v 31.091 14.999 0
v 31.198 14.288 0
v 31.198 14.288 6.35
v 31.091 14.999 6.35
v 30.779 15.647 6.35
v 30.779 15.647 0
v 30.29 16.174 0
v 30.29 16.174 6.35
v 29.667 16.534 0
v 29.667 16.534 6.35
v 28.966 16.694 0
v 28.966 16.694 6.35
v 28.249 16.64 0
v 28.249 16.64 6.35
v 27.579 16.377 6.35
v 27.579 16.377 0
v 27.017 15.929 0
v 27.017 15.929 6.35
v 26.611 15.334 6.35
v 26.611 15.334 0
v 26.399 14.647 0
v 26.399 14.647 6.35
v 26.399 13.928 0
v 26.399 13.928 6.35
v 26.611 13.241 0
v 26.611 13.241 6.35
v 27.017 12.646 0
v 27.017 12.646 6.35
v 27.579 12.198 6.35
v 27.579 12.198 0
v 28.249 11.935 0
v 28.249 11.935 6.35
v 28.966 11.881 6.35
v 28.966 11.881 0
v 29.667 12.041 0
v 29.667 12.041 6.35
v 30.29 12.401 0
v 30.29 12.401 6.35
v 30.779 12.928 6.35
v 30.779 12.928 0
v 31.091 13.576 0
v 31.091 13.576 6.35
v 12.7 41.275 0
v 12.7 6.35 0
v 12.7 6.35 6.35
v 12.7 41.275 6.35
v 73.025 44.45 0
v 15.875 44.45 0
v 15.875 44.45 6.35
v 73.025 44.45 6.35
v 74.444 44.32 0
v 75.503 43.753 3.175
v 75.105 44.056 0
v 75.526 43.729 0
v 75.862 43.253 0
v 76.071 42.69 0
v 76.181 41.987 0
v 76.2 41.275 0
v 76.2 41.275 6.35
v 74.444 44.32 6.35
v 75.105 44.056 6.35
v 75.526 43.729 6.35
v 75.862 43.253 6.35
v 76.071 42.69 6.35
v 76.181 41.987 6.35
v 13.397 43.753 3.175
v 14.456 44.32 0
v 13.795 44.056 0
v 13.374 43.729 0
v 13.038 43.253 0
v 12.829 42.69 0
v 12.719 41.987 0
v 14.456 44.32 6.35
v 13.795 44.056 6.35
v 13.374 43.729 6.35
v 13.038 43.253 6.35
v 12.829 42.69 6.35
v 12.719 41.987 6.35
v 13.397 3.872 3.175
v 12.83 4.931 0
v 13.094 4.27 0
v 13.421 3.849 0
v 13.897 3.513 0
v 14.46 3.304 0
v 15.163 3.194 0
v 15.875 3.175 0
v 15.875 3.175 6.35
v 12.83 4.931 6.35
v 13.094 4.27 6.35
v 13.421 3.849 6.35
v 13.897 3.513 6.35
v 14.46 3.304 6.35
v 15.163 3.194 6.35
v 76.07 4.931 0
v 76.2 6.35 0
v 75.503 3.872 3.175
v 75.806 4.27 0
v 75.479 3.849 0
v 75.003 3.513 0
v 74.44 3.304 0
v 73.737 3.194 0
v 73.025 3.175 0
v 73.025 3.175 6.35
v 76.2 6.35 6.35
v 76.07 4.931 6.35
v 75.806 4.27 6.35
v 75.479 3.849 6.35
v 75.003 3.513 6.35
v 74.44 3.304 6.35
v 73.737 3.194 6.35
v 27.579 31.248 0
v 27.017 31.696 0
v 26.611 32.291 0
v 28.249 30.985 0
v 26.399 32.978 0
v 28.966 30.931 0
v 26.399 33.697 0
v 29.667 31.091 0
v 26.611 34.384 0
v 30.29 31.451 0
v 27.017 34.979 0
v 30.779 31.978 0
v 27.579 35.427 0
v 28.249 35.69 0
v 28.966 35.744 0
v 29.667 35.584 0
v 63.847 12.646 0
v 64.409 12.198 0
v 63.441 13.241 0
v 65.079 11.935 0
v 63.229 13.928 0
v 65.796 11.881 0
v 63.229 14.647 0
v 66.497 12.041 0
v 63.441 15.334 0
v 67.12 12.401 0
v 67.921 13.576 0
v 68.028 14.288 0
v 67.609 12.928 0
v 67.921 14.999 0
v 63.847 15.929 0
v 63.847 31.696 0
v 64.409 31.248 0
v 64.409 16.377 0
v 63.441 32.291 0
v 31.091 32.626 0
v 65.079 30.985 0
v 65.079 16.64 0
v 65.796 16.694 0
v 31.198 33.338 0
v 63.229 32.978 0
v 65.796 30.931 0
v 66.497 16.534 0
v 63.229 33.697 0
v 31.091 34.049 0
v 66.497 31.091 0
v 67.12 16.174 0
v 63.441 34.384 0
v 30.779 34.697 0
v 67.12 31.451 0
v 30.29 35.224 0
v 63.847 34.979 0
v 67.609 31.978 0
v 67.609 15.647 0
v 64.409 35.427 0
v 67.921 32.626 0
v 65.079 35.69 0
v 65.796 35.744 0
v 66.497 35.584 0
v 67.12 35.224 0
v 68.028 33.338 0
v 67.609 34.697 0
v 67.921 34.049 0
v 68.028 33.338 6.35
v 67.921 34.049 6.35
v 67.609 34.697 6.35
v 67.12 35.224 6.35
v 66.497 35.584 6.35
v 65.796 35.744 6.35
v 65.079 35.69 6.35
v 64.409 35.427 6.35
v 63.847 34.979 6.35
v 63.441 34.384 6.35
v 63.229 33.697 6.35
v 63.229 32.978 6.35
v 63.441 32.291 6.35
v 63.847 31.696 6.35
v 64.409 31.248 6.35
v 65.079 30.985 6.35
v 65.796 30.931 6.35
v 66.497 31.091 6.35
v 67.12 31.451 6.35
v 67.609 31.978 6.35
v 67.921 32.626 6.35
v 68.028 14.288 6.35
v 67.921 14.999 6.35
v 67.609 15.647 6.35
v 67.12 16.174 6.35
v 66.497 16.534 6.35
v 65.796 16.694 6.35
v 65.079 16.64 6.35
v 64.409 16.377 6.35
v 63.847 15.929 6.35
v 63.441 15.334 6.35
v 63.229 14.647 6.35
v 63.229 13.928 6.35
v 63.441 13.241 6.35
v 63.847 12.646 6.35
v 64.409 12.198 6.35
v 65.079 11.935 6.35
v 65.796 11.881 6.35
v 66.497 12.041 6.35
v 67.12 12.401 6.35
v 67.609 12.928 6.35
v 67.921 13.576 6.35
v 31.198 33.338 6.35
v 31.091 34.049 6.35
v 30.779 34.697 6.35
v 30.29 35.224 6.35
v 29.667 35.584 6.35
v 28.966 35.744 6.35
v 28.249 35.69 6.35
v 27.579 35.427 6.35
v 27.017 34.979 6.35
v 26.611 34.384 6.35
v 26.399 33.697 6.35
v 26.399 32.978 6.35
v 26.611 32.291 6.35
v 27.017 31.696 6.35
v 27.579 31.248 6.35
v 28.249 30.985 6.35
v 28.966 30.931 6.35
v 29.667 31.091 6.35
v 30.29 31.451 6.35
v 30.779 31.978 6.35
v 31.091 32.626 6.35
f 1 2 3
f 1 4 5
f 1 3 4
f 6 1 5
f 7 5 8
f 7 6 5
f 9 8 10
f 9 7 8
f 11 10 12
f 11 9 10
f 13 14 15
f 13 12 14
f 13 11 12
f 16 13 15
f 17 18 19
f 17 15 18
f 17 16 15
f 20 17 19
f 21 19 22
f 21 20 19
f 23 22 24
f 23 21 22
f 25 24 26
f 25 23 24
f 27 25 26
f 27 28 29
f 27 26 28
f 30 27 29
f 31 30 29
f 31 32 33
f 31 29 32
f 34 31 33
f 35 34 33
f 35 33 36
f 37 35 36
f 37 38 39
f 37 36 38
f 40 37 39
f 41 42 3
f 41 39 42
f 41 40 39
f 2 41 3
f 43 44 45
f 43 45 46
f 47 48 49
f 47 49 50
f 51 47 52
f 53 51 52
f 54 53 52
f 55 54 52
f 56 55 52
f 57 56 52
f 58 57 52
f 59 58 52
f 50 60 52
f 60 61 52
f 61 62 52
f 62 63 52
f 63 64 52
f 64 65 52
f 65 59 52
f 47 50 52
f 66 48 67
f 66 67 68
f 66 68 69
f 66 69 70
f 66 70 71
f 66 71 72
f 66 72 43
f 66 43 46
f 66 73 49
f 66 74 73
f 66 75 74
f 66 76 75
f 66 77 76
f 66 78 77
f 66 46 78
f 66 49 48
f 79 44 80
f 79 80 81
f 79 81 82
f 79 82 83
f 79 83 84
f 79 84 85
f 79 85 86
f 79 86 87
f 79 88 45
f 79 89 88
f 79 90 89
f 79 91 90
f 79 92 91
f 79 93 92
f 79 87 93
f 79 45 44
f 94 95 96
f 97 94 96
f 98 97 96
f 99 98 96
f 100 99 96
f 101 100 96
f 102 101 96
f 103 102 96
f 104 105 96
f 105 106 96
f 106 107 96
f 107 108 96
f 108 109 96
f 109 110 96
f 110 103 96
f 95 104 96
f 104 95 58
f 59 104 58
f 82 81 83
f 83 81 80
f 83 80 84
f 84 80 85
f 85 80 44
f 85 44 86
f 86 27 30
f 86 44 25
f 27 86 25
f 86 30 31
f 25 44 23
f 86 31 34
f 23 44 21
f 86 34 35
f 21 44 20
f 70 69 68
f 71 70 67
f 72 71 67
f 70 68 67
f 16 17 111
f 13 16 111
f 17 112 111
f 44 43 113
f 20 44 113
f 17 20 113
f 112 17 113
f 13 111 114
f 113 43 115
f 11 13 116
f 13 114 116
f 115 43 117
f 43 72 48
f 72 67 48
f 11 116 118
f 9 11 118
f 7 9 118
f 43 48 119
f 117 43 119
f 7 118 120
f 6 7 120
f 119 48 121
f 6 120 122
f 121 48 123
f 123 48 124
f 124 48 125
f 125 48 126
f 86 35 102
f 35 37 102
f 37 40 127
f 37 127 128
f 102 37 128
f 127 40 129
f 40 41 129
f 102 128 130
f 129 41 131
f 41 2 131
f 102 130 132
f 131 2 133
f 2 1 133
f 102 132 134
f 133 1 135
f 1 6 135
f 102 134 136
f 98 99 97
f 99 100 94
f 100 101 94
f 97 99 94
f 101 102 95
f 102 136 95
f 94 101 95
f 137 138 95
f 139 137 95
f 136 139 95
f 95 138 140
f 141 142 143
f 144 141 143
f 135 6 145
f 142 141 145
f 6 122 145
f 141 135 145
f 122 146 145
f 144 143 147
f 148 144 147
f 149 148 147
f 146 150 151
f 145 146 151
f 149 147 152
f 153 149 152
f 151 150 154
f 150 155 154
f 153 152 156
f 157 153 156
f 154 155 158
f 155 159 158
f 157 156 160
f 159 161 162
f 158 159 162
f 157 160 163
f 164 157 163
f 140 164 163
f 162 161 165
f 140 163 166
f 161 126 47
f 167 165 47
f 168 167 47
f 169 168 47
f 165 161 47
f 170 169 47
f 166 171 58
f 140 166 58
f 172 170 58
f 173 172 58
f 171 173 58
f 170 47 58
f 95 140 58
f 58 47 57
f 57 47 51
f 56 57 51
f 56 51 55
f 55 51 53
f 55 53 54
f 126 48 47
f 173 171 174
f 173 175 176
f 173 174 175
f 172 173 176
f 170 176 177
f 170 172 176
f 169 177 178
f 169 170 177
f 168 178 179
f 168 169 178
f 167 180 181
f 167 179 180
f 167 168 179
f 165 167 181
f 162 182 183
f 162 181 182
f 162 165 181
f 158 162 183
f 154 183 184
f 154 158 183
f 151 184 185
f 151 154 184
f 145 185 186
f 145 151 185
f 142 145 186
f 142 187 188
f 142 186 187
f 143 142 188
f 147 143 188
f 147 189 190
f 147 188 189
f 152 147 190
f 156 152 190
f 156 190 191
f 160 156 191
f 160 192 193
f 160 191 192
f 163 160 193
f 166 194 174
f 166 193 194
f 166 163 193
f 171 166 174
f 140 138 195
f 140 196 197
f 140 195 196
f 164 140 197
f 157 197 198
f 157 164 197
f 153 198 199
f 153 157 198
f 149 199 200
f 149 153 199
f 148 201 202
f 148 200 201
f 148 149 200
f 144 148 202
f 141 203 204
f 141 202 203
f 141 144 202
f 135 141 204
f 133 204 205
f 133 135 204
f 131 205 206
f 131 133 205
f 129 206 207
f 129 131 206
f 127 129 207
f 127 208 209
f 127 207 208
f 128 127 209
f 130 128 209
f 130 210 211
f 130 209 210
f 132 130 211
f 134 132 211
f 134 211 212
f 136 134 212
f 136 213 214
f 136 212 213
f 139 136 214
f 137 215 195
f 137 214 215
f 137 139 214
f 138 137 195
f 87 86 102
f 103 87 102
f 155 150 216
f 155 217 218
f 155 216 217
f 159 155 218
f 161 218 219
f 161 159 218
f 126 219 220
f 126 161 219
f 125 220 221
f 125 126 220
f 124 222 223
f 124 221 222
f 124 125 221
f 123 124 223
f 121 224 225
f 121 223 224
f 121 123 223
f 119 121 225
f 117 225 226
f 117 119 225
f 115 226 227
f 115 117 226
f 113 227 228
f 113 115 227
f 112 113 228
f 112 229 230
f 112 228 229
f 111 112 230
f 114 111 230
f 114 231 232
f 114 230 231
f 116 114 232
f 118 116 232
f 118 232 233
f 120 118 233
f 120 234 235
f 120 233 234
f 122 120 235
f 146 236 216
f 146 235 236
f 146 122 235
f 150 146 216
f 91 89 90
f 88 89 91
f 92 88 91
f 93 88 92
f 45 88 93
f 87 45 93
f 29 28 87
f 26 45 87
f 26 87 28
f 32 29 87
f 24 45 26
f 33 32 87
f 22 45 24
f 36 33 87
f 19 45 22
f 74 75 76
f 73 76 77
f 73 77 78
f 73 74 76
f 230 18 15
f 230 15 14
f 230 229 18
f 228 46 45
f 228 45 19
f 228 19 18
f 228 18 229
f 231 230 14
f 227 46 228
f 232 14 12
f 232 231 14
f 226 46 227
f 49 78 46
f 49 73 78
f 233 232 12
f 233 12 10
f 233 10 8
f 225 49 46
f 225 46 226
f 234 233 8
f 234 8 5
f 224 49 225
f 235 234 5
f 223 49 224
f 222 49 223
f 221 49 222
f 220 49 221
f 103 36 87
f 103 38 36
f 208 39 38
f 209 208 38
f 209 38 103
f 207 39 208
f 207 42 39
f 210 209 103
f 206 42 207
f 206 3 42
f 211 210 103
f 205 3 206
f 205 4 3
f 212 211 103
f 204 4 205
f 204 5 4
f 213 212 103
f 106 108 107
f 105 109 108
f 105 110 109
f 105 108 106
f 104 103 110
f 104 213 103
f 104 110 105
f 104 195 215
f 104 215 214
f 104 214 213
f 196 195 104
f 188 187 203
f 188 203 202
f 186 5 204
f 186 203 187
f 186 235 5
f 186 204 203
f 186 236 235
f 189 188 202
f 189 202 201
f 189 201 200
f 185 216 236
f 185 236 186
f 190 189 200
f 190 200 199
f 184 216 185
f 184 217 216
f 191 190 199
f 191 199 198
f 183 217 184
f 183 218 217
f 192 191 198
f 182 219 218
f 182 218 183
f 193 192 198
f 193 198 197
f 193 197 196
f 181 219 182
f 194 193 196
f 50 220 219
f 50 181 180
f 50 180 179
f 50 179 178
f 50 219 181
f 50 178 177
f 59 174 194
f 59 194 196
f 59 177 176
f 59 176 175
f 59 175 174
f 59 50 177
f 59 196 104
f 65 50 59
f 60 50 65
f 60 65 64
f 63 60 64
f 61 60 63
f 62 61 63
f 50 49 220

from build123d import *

# Parameters (mm, degrees)
SKETCH1_W               = 63.5
SKETCH1_H               = 41.275
BOSS_EXTRUDE1_DEPTH     = 6.35
CUT_EXTRUDE1_DEPTH      = 89.44526556
CUT_EXTRUDE1_DEPTH_BACK = 89.44526556
SKETCH3_R               = 2.413
FILLET1_SIZE            = 3.175


with BuildPart() as part:
    # Sketch1 → Boss-Extrude1 (new body)
    with BuildSketch(Plane.XY):
        with Locations((44.45, 23.8125)):
            Rectangle(SKETCH1_W, SKETCH1_H)
    extrude(amount=BOSS_EXTRUDE1_DEPTH)

    # Sketch3 → Cut-Extrude1 (cut, two sides: drawn at the far end of the back side and taken through both)
    with BuildSketch(Plane.XY.offset(6.35).offset(-CUT_EXTRUDE1_DEPTH_BACK)):
        with Locations((65.615475516, 33.3375)):
            Circle(SKETCH3_R)
        with Locations((28.785475516, 33.3375)):
            Circle(SKETCH3_R)
        with Locations((28.785475516, 14.2875)):
            Circle(SKETCH3_R)
        with Locations((65.615475516, 14.2875)):
            Circle(SKETCH3_R)
    extrude(amount=CUT_EXTRUDE1_DEPTH + CUT_EXTRUDE1_DEPTH_BACK, mode=Mode.SUBTRACT)

    # Fillet1
    # a fillet whose section is not a circle: 3.175 mm, written as the material it takes off along each edge
    with BuildSketch(Plane(origin=(12.7, 3.175, -7.9375), x_dir=(1, 0, 0), z_dir=(0, 0, 1)), Plane(origin=(12.7, 44.45, -7.9375), x_dir=(0, -1, 0), z_dir=(0, 0, 1))) as fillet1_piece_1:
        with BuildLine():
            add(Edge.make_bspline([(FILLET1_SIZE, 0), (FILLET1_SIZE * 0.831801948466, 0), (FILLET1_SIZE * 0.663603896932, 0), (FILLET1_SIZE * 0.292893218813, FILLET1_SIZE * 0.0716919198361), (FILLET1_SIZE * 0.0716919198361, FILLET1_SIZE * 0.292893218813), (0, FILLET1_SIZE * 0.663603896932), (0, FILLET1_SIZE * 0.831801948466), (0, FILLET1_SIZE)], knots=[0, 0, 0, 0, 0, 0, 0.5, 0.5, 1, 1, 1, 1, 1, 1], degree=5))
            Line((0, FILLET1_SIZE), (0, 0))
            Line((0, 0), (FILLET1_SIZE, 0))
        make_face()
    extrude(amount=22.225, mode=Mode.SUBTRACT)
    with BuildSketch(Plane(origin=(76.2, 3.175, -7.9375), x_dir=(-1, 0, 0), z_dir=(0, 0, 1)), Plane(origin=(76.2, 44.45, -7.9375), x_dir=(0, -1, 0), z_dir=(0, 0, 1))) as fillet1_piece_2:
        with BuildLine():
            add(Edge.make_bspline([(FILLET1_SIZE, 0), (FILLET1_SIZE * 0.831801948466, 0), (FILLET1_SIZE * 0.663603896932, 0), (FILLET1_SIZE * 0.292893218813, -FILLET1_SIZE * 0.0716919198361), (FILLET1_SIZE * 0.0716919198361, -FILLET1_SIZE * 0.292893218813), (0, -FILLET1_SIZE * 0.663603896932), (0, -FILLET1_SIZE * 0.831801948466), (0, -FILLET1_SIZE)], knots=[0, 0, 0, 0, 0, 0, 0.5, 0.5, 1, 1, 1, 1, 1, 1], degree=5))
            Line((0, -FILLET1_SIZE), (0, 0))
            Line((0, 0), (FILLET1_SIZE, 0))
        make_face()
    extrude(amount=22.225, mode=Mode.SUBTRACT)


solid = part.part
